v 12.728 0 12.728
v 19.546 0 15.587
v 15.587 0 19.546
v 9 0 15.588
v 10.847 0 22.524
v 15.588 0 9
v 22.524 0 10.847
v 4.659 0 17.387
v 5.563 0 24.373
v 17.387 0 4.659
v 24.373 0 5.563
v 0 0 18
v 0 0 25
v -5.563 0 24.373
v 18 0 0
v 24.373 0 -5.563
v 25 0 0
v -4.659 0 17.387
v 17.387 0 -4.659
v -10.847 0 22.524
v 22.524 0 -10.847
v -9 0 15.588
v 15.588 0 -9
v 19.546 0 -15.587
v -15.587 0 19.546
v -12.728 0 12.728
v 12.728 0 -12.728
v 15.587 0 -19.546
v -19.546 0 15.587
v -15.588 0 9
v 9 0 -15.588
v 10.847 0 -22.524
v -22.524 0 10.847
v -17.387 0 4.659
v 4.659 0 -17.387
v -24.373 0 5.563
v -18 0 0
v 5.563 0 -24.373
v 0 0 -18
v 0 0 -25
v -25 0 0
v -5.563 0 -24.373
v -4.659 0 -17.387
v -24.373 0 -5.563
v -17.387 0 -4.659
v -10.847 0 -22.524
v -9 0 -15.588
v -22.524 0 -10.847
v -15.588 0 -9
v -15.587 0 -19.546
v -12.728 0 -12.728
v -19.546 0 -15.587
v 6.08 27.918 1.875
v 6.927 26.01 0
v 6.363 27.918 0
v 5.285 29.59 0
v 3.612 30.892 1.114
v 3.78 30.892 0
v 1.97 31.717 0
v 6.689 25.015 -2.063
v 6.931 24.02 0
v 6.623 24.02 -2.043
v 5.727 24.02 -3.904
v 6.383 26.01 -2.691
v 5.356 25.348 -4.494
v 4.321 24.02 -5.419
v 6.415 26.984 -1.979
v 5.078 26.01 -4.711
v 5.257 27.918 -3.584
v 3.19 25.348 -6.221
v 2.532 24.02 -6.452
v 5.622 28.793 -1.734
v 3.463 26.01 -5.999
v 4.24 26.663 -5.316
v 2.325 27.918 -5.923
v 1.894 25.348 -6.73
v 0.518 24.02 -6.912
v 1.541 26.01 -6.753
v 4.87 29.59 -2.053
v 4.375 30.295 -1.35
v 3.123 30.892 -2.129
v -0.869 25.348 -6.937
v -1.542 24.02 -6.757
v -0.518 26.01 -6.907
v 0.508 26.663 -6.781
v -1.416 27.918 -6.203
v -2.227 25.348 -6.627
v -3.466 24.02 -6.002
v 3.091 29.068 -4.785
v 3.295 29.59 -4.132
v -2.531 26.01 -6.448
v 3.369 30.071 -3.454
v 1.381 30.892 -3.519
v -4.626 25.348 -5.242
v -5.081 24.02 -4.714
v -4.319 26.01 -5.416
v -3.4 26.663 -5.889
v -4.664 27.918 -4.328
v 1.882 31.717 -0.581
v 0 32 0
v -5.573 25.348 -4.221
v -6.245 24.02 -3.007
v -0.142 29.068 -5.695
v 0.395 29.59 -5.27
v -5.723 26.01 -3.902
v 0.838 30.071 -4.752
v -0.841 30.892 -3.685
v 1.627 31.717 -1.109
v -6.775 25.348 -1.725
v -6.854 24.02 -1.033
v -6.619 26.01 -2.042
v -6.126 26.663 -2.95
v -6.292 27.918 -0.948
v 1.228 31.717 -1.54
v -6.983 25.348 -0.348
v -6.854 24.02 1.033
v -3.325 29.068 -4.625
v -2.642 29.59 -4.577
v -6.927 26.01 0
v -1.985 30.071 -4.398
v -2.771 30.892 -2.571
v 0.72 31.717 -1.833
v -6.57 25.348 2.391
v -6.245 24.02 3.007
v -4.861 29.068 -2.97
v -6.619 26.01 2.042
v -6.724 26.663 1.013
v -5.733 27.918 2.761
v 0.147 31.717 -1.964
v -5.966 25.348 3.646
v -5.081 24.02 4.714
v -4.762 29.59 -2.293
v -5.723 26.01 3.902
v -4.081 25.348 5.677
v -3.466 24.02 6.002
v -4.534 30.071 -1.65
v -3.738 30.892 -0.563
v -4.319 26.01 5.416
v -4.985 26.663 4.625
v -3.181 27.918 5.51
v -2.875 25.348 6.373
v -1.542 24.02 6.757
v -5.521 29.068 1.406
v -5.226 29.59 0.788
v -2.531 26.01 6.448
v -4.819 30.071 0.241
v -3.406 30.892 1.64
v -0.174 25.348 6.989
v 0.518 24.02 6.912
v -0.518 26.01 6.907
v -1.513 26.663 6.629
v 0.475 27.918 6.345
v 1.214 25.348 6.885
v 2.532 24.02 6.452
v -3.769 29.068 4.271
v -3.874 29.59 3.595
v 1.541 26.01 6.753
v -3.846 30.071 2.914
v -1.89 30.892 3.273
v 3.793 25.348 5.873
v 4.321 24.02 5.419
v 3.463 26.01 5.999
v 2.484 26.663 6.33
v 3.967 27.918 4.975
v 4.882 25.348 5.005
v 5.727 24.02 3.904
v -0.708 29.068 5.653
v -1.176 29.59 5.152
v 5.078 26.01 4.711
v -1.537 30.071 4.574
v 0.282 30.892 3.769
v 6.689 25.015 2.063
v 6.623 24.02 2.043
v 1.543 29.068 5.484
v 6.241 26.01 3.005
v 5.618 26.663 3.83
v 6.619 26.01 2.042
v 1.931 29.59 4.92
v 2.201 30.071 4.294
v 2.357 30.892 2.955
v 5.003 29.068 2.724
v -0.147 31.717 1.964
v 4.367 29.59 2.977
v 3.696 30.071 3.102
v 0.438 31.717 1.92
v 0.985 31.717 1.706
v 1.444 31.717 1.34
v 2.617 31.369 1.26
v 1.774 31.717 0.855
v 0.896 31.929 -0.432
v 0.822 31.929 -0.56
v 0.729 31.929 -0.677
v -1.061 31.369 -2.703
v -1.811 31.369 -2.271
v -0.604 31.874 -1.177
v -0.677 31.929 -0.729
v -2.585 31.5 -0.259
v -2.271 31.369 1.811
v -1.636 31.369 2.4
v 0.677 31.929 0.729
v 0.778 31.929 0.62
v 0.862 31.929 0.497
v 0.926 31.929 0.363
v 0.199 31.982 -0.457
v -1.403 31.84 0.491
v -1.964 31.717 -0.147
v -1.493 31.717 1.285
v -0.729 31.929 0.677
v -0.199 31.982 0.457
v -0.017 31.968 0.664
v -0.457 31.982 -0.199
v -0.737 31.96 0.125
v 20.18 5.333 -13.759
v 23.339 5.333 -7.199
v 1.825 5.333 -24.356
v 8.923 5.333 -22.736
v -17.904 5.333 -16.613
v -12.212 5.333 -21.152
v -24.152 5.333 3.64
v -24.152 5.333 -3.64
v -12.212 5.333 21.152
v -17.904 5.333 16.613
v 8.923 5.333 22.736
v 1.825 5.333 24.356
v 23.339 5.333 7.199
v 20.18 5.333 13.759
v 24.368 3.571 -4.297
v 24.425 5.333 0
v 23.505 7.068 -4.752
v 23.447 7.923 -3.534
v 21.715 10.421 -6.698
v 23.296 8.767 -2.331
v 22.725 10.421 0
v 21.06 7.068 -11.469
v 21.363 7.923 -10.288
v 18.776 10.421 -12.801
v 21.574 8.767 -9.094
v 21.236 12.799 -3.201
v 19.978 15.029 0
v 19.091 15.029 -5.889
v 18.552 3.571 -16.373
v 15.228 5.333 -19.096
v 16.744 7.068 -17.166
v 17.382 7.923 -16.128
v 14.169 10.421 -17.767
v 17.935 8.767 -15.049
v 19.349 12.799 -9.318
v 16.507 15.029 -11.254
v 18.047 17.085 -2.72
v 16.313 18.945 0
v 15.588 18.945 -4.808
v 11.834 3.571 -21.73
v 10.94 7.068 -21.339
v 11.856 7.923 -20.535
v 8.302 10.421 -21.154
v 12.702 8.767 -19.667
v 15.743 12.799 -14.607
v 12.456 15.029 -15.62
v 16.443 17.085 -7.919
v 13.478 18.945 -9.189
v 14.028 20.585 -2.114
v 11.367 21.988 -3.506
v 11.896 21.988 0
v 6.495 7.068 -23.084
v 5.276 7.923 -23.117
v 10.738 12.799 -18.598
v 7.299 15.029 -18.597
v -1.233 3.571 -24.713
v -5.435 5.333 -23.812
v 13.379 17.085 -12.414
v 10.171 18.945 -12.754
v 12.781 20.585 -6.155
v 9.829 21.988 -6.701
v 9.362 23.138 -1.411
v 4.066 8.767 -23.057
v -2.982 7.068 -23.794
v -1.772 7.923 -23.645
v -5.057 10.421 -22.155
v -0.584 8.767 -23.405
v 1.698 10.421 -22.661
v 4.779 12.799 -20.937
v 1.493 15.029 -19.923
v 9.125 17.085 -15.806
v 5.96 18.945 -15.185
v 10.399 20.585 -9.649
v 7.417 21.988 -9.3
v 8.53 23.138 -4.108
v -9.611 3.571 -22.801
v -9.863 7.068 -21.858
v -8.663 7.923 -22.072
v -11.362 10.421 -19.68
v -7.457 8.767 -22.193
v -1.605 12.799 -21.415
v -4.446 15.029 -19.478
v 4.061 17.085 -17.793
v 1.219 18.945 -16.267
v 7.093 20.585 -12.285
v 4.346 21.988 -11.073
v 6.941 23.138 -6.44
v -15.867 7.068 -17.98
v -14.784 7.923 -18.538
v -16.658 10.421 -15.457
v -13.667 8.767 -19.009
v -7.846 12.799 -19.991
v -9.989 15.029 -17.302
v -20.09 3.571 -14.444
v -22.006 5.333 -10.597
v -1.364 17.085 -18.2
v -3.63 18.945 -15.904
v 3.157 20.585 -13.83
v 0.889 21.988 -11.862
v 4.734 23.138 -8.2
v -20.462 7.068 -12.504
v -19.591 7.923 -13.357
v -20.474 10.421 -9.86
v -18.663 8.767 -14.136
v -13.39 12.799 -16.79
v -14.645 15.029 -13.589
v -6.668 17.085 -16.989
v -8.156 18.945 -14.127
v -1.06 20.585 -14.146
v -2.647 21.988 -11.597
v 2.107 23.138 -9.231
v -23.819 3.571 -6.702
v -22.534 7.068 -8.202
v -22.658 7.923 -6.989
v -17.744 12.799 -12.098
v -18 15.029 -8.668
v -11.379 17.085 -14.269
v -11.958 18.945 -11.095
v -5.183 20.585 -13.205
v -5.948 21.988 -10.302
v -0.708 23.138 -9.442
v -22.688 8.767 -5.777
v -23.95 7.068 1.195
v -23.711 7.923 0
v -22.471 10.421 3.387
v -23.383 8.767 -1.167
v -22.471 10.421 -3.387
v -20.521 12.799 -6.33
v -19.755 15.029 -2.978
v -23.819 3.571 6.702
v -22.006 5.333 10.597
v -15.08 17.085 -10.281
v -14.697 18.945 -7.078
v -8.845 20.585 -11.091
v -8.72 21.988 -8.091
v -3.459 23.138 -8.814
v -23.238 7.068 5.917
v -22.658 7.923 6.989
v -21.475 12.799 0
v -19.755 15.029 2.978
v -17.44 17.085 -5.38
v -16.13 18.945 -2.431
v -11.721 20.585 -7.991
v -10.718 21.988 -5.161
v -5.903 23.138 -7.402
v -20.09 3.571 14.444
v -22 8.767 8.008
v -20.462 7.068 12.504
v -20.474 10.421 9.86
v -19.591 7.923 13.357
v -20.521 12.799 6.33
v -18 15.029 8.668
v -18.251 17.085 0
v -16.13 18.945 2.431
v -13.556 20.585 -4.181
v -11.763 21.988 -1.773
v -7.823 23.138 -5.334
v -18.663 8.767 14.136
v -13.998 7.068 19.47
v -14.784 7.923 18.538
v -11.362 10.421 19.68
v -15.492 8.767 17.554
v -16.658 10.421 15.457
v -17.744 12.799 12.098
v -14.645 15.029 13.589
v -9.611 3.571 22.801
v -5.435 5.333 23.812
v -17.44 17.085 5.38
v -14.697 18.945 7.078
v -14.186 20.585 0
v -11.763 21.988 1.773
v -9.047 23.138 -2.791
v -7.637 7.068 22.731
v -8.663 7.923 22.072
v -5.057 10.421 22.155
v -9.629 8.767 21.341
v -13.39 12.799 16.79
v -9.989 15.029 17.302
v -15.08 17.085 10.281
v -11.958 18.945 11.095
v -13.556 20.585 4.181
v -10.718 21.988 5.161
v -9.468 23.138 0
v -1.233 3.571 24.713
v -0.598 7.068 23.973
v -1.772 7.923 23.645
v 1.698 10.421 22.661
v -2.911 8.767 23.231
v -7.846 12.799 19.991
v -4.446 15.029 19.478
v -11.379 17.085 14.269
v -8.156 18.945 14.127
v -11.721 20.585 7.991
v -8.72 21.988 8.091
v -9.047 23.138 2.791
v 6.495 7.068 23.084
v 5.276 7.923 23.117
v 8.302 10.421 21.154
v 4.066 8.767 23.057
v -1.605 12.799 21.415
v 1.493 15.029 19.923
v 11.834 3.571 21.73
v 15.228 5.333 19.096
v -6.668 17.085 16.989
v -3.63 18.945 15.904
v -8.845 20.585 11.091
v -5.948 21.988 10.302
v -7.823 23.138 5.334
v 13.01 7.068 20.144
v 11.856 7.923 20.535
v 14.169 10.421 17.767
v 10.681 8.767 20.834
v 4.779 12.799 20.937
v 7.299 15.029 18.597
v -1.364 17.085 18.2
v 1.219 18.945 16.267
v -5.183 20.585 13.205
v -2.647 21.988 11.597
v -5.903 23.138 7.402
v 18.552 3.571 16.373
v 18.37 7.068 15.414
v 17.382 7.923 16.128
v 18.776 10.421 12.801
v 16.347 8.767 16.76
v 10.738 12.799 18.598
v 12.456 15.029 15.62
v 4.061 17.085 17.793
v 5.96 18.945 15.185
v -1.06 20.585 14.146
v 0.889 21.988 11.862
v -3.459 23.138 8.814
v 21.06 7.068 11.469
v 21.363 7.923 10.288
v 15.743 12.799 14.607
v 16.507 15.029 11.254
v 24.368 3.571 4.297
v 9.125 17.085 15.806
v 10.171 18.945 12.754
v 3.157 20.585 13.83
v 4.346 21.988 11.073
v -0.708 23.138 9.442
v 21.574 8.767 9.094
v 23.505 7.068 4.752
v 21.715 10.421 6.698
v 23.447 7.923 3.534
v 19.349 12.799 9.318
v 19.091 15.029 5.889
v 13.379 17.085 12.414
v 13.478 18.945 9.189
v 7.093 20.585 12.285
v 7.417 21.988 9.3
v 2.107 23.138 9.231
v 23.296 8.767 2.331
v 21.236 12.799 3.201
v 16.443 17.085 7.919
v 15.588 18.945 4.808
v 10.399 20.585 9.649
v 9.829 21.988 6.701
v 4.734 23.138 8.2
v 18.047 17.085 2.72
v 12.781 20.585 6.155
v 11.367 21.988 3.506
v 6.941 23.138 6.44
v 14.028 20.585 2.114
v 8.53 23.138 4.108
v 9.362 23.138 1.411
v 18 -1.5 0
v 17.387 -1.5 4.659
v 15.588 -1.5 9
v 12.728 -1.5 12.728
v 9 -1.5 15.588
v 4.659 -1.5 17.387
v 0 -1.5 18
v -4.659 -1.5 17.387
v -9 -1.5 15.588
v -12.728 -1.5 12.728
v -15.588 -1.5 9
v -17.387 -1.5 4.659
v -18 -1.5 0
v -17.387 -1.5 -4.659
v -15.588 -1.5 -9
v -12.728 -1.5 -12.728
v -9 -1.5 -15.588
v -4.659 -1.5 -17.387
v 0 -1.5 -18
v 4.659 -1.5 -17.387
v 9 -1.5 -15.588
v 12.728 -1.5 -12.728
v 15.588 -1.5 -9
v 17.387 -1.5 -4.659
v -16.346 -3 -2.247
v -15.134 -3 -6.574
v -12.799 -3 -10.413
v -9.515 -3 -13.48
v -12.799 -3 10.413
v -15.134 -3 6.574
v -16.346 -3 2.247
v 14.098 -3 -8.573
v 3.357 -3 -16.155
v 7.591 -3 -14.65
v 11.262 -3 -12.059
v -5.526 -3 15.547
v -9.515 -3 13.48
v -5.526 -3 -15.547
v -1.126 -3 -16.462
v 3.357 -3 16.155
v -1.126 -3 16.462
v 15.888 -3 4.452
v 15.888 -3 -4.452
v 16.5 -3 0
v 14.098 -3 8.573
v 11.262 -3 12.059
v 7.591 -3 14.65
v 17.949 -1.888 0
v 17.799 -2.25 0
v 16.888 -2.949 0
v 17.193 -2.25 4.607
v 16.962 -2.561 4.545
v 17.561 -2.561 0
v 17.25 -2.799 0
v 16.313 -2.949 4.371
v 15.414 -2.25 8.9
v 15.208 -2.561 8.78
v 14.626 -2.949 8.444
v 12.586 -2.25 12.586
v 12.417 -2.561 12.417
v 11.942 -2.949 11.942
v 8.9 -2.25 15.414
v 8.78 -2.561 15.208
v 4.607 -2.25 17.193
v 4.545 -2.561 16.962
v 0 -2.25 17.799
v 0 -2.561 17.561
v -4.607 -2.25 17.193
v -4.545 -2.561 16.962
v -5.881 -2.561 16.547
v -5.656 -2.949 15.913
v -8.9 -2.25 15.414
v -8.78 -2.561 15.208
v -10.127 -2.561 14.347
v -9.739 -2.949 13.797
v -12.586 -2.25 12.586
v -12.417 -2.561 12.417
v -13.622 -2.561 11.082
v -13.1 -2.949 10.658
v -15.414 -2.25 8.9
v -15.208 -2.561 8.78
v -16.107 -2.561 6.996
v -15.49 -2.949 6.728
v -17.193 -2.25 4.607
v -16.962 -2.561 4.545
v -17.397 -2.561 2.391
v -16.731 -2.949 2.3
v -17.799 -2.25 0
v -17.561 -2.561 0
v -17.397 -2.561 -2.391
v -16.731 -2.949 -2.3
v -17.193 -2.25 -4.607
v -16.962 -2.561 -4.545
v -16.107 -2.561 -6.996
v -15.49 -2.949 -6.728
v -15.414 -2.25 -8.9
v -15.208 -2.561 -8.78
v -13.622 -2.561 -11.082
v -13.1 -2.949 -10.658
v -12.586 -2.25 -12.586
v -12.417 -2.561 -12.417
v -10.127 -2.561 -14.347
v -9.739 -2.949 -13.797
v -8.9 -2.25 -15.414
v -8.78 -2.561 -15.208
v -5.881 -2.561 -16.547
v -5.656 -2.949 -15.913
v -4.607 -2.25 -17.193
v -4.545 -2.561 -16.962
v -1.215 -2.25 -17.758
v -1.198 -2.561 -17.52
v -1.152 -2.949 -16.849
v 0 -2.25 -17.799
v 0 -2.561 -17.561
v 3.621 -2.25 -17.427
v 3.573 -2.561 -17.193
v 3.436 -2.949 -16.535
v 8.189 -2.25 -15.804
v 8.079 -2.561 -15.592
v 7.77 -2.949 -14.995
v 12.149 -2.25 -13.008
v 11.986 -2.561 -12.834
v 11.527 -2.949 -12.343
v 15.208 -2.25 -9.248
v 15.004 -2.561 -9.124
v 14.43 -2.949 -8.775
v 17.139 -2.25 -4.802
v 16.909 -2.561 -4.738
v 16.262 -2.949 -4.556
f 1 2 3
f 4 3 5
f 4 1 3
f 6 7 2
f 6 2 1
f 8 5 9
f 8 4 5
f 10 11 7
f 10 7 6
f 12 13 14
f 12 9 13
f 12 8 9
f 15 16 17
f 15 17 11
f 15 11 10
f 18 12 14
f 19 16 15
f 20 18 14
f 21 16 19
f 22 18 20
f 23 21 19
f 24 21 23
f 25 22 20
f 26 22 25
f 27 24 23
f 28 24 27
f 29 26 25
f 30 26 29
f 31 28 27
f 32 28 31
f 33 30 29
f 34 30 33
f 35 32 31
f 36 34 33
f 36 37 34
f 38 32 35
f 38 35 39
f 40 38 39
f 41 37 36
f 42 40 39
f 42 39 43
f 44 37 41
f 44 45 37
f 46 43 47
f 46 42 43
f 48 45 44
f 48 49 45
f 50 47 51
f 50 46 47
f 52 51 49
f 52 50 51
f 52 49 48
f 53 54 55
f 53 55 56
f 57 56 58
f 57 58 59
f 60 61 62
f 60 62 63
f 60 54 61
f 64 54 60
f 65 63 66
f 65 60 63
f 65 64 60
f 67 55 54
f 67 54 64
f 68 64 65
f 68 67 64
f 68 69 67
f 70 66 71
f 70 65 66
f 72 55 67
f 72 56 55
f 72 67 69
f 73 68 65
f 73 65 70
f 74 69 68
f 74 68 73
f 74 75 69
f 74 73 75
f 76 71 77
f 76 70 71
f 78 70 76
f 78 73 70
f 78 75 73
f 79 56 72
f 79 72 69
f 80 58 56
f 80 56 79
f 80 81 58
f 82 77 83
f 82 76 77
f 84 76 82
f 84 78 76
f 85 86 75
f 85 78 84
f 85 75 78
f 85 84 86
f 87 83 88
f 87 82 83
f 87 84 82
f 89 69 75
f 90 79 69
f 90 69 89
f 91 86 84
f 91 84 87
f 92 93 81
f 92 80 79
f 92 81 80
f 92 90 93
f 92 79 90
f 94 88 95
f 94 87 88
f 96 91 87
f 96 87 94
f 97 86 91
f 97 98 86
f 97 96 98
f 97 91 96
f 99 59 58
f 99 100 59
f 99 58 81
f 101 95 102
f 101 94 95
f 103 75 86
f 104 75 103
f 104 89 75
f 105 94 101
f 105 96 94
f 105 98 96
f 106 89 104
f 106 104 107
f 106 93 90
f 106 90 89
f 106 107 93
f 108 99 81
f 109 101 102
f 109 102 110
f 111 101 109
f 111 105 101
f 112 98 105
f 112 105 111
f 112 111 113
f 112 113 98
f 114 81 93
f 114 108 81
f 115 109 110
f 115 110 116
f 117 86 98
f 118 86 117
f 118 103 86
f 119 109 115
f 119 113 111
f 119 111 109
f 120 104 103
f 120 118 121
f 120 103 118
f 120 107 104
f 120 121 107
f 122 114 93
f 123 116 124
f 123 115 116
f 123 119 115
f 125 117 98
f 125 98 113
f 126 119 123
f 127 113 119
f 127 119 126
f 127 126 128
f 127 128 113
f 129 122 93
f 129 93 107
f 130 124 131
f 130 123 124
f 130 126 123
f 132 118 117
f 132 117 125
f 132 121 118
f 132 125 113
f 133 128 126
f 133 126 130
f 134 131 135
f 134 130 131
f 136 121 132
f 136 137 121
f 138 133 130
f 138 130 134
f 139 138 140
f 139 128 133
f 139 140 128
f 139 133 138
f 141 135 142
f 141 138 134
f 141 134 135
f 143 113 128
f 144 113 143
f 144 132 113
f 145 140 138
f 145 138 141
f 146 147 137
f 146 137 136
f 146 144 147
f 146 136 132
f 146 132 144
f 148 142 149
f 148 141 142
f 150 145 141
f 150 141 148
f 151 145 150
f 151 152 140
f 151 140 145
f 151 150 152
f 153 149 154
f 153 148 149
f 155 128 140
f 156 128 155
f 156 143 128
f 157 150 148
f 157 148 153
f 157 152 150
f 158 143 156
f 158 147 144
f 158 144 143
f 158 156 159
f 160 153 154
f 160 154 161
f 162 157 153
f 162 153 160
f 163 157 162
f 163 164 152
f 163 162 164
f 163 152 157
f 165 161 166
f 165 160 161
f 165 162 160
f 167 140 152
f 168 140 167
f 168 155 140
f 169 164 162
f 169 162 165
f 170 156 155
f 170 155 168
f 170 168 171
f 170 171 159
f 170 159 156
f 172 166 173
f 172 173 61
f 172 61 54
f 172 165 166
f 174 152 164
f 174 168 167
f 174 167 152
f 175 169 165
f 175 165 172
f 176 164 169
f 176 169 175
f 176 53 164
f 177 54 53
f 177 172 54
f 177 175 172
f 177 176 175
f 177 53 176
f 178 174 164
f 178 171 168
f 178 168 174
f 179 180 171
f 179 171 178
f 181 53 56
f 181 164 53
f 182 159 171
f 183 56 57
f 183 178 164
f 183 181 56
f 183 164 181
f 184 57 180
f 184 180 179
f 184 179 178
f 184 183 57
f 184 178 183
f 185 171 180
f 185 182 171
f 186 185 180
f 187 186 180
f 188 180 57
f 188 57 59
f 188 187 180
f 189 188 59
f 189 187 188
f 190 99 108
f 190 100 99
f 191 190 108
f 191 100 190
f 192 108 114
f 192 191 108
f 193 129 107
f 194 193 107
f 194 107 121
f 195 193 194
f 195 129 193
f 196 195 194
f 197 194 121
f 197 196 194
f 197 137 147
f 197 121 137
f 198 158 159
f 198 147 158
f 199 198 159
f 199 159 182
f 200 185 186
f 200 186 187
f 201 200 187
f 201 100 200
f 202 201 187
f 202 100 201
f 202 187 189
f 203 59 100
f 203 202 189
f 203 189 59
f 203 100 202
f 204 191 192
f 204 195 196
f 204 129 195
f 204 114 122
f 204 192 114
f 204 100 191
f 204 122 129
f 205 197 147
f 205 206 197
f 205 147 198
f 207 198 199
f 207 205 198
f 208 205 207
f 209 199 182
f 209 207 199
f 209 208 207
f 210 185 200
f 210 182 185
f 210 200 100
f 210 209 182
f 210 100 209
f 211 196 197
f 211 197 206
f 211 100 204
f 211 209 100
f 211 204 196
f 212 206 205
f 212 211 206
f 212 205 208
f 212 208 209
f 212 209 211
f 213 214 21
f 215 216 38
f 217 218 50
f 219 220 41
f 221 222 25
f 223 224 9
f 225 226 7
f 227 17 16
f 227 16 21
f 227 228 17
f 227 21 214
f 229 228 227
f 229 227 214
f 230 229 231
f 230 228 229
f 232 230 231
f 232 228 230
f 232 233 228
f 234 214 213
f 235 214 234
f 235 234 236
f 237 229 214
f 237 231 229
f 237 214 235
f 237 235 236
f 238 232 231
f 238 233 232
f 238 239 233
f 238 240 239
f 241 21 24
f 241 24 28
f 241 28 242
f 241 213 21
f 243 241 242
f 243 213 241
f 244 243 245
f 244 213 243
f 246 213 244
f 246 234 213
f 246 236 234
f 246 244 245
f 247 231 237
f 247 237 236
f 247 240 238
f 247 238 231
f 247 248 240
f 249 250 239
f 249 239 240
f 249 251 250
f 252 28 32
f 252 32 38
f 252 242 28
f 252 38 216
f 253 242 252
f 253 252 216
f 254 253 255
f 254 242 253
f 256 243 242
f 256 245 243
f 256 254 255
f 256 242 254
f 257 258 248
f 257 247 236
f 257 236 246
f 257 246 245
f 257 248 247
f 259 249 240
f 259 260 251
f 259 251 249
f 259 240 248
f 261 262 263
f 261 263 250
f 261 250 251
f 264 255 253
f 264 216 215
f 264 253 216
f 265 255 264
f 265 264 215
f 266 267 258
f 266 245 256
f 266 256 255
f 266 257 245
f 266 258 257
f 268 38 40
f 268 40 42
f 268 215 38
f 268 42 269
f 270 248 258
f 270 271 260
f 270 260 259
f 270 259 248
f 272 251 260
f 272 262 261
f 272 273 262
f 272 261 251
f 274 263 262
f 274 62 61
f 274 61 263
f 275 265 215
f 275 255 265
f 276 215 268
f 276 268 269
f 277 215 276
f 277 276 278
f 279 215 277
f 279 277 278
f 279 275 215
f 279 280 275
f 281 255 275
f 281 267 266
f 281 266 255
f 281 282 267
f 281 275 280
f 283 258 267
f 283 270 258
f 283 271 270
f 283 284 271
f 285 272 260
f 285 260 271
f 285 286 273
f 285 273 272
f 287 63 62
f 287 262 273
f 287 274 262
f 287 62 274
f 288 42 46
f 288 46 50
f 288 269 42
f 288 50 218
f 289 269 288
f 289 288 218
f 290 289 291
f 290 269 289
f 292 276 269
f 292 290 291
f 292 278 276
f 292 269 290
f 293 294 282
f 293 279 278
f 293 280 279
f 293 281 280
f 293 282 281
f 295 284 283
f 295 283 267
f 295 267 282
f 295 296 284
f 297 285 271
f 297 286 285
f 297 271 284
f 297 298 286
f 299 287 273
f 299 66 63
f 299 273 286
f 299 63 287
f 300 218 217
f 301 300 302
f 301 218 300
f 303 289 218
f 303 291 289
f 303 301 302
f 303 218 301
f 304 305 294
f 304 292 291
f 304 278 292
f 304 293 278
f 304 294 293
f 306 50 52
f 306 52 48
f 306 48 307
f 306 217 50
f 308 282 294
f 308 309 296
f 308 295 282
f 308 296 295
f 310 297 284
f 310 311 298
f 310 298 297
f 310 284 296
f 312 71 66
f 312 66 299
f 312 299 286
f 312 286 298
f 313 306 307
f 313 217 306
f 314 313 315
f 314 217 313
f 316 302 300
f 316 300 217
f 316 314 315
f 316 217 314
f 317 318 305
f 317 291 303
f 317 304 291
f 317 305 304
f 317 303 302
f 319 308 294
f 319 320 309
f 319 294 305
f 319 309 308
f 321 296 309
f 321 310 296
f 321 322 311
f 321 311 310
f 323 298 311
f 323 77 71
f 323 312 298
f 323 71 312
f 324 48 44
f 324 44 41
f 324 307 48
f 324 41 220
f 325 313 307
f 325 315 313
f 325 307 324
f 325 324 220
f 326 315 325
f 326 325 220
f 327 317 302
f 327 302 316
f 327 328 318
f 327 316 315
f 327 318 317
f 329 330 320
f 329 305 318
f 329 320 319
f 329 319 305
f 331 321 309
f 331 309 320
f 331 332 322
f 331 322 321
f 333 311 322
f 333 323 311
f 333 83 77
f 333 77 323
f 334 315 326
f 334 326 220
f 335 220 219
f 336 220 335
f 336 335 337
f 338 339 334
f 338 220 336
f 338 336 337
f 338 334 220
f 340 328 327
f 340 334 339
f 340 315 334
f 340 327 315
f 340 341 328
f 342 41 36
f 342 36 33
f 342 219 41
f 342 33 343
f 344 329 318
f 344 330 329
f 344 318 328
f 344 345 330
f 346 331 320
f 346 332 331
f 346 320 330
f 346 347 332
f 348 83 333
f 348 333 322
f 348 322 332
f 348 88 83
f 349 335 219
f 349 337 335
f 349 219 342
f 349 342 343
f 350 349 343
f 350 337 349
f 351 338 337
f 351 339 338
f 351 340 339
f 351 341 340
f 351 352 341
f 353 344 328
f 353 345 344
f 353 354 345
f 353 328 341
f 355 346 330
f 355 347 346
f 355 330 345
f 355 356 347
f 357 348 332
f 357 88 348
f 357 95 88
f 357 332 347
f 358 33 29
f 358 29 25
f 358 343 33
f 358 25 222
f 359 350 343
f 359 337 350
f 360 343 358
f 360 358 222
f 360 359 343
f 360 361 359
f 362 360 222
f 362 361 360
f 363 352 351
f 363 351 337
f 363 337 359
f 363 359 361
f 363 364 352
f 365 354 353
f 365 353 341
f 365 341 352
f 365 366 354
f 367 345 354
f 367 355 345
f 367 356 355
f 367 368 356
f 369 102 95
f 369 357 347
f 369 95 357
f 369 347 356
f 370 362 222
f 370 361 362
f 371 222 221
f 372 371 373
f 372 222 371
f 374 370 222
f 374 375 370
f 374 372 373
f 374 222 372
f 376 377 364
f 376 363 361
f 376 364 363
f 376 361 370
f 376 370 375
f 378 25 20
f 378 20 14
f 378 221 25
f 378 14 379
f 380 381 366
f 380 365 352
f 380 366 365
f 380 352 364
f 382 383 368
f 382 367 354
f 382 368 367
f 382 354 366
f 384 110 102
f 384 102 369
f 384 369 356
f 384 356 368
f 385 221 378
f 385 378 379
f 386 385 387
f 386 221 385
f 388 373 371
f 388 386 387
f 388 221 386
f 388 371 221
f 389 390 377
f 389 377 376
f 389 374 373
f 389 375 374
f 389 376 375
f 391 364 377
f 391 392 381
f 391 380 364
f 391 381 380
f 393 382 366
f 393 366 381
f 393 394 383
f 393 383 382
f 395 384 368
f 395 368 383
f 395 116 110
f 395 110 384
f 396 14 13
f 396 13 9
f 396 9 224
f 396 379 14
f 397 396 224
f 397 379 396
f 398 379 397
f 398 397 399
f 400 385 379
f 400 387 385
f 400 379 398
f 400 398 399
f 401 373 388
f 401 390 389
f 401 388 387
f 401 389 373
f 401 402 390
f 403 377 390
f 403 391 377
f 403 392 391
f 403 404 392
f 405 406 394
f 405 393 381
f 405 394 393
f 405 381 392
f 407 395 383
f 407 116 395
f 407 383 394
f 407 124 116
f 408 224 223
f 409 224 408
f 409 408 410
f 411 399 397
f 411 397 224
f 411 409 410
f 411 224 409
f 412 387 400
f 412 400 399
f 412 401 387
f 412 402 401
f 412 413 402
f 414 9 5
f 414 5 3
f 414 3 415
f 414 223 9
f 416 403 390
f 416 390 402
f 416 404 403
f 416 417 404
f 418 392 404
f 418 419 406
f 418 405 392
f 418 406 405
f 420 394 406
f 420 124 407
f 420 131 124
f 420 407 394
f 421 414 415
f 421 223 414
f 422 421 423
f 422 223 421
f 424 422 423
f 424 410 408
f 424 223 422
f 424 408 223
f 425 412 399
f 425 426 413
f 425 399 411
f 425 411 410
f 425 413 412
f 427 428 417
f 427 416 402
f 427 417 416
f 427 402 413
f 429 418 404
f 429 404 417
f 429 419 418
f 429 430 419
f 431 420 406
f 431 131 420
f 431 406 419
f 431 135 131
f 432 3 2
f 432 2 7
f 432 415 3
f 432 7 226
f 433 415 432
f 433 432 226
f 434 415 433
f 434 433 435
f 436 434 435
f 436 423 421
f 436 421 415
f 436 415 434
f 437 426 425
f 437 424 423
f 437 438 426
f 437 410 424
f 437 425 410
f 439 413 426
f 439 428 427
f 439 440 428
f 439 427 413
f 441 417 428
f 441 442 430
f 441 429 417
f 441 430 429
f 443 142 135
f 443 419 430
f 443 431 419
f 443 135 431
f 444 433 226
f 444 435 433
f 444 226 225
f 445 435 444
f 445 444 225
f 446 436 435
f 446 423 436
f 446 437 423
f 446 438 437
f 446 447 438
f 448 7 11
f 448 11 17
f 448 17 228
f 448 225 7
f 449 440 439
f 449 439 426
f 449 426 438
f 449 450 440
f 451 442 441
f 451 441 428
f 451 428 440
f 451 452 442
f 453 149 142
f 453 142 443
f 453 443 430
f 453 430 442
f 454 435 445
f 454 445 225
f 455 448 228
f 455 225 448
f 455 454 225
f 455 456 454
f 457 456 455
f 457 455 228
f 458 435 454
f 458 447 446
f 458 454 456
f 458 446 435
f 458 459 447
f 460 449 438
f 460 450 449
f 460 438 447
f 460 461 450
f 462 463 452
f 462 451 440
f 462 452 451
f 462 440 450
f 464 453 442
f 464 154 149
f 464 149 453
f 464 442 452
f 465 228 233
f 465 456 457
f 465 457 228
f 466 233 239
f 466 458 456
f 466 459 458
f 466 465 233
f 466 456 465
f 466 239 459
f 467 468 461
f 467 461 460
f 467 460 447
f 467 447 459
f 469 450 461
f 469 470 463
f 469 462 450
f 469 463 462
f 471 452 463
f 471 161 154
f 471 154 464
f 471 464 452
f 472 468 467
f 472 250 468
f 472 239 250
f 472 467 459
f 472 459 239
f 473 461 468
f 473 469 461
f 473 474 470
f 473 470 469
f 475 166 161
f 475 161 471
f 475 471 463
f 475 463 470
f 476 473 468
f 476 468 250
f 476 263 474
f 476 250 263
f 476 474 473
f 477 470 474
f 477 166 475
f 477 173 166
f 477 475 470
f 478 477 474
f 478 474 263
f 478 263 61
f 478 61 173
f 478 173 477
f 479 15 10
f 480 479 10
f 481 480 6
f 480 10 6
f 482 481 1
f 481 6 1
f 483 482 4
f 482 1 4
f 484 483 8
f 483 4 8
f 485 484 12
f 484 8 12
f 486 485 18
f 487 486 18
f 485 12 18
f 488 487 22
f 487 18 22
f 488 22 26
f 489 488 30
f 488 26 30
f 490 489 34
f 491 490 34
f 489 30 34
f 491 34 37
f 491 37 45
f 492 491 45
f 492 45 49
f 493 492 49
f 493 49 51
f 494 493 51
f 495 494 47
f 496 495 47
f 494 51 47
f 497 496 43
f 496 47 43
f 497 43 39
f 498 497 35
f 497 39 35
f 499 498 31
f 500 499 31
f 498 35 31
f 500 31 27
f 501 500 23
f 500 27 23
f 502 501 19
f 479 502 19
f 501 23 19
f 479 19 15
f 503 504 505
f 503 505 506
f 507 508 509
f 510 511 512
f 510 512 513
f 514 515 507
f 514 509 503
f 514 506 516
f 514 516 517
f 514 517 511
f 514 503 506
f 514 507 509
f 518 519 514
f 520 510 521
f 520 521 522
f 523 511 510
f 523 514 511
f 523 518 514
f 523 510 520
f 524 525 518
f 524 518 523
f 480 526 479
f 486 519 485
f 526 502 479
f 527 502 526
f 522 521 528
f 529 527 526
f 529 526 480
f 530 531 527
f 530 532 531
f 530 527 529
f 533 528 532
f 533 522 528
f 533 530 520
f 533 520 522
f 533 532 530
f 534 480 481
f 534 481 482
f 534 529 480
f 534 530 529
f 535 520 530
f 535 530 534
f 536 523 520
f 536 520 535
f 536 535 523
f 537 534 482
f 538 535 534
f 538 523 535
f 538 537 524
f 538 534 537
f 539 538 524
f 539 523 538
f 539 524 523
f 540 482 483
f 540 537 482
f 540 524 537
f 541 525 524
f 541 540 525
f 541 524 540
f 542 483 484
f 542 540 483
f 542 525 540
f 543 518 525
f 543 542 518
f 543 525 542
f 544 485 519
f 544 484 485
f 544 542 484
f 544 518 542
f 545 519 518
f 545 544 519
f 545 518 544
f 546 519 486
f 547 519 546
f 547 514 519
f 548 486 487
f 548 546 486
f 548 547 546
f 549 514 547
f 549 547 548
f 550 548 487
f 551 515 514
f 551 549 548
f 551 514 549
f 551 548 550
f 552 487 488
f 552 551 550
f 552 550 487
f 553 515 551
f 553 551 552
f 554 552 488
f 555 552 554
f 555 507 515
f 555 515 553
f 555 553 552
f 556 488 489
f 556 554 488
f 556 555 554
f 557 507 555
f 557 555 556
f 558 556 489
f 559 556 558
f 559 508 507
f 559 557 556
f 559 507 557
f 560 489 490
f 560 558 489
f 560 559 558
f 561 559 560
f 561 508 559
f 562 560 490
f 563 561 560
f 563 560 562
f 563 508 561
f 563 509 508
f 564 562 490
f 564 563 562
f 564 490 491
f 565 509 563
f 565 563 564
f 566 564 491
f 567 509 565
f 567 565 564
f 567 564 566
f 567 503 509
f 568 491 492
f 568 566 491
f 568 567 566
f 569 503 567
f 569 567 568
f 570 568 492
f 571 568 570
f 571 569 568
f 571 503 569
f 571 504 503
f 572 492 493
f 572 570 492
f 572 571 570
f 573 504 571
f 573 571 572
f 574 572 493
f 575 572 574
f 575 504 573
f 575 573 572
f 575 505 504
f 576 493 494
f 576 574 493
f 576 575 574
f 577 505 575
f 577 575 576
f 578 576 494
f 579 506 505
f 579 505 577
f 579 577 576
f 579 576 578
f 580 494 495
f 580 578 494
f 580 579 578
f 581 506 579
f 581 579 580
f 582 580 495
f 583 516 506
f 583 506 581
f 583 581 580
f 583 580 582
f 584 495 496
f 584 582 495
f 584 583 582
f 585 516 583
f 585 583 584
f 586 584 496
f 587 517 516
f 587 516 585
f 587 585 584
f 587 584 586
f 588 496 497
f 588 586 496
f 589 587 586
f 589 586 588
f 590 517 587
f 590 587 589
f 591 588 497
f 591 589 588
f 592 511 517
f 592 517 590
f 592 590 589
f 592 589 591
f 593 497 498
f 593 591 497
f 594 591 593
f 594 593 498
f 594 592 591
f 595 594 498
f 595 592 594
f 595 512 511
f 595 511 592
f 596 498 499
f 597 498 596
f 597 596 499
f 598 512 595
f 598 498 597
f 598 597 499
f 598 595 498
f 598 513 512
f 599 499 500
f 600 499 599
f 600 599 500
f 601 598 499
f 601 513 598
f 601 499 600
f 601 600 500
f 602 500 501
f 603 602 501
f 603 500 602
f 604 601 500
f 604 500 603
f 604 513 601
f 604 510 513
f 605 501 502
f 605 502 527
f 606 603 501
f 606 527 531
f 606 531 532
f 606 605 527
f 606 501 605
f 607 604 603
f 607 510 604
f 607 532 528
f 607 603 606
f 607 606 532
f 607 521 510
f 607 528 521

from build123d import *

# Parameters (mm, degrees)
F2_R     = 18
F3_DEPTH = 3
F4_R     = 1.5


with BuildPart() as f1:
    # F0 (on Top) → F1 (revolve)
    with BuildSketch(Plane.XY):
        with BuildLine():
            Line((0, 0), (25, 0))
            ThreePointArc((25, 0), (19.978445, 15.028697), (6.931061, 24.02))
            ThreePointArc((6.931061, 24.02), (5.284884, 29.590207), (0, 32))
            Line((0, 32), (0, 18))
            Line((0, 18), (0, 0))
        make_face()
    revolve(axis=Axis((0, 25, 0), (0, 1, 0)))

    # F2 (on Front) → F3 (join)
    with BuildSketch(Plane.XZ):
        Circle(F2_R)
    extrude(amount=F3_DEPTH)

    # F4
    f4_edges = [f1.edges().sort_by_distance(p)[0] for p in [
        (-18, -3, 0),
    ]]
    fillet(f4_edges, radius=F4_R)


solid = f1.part
